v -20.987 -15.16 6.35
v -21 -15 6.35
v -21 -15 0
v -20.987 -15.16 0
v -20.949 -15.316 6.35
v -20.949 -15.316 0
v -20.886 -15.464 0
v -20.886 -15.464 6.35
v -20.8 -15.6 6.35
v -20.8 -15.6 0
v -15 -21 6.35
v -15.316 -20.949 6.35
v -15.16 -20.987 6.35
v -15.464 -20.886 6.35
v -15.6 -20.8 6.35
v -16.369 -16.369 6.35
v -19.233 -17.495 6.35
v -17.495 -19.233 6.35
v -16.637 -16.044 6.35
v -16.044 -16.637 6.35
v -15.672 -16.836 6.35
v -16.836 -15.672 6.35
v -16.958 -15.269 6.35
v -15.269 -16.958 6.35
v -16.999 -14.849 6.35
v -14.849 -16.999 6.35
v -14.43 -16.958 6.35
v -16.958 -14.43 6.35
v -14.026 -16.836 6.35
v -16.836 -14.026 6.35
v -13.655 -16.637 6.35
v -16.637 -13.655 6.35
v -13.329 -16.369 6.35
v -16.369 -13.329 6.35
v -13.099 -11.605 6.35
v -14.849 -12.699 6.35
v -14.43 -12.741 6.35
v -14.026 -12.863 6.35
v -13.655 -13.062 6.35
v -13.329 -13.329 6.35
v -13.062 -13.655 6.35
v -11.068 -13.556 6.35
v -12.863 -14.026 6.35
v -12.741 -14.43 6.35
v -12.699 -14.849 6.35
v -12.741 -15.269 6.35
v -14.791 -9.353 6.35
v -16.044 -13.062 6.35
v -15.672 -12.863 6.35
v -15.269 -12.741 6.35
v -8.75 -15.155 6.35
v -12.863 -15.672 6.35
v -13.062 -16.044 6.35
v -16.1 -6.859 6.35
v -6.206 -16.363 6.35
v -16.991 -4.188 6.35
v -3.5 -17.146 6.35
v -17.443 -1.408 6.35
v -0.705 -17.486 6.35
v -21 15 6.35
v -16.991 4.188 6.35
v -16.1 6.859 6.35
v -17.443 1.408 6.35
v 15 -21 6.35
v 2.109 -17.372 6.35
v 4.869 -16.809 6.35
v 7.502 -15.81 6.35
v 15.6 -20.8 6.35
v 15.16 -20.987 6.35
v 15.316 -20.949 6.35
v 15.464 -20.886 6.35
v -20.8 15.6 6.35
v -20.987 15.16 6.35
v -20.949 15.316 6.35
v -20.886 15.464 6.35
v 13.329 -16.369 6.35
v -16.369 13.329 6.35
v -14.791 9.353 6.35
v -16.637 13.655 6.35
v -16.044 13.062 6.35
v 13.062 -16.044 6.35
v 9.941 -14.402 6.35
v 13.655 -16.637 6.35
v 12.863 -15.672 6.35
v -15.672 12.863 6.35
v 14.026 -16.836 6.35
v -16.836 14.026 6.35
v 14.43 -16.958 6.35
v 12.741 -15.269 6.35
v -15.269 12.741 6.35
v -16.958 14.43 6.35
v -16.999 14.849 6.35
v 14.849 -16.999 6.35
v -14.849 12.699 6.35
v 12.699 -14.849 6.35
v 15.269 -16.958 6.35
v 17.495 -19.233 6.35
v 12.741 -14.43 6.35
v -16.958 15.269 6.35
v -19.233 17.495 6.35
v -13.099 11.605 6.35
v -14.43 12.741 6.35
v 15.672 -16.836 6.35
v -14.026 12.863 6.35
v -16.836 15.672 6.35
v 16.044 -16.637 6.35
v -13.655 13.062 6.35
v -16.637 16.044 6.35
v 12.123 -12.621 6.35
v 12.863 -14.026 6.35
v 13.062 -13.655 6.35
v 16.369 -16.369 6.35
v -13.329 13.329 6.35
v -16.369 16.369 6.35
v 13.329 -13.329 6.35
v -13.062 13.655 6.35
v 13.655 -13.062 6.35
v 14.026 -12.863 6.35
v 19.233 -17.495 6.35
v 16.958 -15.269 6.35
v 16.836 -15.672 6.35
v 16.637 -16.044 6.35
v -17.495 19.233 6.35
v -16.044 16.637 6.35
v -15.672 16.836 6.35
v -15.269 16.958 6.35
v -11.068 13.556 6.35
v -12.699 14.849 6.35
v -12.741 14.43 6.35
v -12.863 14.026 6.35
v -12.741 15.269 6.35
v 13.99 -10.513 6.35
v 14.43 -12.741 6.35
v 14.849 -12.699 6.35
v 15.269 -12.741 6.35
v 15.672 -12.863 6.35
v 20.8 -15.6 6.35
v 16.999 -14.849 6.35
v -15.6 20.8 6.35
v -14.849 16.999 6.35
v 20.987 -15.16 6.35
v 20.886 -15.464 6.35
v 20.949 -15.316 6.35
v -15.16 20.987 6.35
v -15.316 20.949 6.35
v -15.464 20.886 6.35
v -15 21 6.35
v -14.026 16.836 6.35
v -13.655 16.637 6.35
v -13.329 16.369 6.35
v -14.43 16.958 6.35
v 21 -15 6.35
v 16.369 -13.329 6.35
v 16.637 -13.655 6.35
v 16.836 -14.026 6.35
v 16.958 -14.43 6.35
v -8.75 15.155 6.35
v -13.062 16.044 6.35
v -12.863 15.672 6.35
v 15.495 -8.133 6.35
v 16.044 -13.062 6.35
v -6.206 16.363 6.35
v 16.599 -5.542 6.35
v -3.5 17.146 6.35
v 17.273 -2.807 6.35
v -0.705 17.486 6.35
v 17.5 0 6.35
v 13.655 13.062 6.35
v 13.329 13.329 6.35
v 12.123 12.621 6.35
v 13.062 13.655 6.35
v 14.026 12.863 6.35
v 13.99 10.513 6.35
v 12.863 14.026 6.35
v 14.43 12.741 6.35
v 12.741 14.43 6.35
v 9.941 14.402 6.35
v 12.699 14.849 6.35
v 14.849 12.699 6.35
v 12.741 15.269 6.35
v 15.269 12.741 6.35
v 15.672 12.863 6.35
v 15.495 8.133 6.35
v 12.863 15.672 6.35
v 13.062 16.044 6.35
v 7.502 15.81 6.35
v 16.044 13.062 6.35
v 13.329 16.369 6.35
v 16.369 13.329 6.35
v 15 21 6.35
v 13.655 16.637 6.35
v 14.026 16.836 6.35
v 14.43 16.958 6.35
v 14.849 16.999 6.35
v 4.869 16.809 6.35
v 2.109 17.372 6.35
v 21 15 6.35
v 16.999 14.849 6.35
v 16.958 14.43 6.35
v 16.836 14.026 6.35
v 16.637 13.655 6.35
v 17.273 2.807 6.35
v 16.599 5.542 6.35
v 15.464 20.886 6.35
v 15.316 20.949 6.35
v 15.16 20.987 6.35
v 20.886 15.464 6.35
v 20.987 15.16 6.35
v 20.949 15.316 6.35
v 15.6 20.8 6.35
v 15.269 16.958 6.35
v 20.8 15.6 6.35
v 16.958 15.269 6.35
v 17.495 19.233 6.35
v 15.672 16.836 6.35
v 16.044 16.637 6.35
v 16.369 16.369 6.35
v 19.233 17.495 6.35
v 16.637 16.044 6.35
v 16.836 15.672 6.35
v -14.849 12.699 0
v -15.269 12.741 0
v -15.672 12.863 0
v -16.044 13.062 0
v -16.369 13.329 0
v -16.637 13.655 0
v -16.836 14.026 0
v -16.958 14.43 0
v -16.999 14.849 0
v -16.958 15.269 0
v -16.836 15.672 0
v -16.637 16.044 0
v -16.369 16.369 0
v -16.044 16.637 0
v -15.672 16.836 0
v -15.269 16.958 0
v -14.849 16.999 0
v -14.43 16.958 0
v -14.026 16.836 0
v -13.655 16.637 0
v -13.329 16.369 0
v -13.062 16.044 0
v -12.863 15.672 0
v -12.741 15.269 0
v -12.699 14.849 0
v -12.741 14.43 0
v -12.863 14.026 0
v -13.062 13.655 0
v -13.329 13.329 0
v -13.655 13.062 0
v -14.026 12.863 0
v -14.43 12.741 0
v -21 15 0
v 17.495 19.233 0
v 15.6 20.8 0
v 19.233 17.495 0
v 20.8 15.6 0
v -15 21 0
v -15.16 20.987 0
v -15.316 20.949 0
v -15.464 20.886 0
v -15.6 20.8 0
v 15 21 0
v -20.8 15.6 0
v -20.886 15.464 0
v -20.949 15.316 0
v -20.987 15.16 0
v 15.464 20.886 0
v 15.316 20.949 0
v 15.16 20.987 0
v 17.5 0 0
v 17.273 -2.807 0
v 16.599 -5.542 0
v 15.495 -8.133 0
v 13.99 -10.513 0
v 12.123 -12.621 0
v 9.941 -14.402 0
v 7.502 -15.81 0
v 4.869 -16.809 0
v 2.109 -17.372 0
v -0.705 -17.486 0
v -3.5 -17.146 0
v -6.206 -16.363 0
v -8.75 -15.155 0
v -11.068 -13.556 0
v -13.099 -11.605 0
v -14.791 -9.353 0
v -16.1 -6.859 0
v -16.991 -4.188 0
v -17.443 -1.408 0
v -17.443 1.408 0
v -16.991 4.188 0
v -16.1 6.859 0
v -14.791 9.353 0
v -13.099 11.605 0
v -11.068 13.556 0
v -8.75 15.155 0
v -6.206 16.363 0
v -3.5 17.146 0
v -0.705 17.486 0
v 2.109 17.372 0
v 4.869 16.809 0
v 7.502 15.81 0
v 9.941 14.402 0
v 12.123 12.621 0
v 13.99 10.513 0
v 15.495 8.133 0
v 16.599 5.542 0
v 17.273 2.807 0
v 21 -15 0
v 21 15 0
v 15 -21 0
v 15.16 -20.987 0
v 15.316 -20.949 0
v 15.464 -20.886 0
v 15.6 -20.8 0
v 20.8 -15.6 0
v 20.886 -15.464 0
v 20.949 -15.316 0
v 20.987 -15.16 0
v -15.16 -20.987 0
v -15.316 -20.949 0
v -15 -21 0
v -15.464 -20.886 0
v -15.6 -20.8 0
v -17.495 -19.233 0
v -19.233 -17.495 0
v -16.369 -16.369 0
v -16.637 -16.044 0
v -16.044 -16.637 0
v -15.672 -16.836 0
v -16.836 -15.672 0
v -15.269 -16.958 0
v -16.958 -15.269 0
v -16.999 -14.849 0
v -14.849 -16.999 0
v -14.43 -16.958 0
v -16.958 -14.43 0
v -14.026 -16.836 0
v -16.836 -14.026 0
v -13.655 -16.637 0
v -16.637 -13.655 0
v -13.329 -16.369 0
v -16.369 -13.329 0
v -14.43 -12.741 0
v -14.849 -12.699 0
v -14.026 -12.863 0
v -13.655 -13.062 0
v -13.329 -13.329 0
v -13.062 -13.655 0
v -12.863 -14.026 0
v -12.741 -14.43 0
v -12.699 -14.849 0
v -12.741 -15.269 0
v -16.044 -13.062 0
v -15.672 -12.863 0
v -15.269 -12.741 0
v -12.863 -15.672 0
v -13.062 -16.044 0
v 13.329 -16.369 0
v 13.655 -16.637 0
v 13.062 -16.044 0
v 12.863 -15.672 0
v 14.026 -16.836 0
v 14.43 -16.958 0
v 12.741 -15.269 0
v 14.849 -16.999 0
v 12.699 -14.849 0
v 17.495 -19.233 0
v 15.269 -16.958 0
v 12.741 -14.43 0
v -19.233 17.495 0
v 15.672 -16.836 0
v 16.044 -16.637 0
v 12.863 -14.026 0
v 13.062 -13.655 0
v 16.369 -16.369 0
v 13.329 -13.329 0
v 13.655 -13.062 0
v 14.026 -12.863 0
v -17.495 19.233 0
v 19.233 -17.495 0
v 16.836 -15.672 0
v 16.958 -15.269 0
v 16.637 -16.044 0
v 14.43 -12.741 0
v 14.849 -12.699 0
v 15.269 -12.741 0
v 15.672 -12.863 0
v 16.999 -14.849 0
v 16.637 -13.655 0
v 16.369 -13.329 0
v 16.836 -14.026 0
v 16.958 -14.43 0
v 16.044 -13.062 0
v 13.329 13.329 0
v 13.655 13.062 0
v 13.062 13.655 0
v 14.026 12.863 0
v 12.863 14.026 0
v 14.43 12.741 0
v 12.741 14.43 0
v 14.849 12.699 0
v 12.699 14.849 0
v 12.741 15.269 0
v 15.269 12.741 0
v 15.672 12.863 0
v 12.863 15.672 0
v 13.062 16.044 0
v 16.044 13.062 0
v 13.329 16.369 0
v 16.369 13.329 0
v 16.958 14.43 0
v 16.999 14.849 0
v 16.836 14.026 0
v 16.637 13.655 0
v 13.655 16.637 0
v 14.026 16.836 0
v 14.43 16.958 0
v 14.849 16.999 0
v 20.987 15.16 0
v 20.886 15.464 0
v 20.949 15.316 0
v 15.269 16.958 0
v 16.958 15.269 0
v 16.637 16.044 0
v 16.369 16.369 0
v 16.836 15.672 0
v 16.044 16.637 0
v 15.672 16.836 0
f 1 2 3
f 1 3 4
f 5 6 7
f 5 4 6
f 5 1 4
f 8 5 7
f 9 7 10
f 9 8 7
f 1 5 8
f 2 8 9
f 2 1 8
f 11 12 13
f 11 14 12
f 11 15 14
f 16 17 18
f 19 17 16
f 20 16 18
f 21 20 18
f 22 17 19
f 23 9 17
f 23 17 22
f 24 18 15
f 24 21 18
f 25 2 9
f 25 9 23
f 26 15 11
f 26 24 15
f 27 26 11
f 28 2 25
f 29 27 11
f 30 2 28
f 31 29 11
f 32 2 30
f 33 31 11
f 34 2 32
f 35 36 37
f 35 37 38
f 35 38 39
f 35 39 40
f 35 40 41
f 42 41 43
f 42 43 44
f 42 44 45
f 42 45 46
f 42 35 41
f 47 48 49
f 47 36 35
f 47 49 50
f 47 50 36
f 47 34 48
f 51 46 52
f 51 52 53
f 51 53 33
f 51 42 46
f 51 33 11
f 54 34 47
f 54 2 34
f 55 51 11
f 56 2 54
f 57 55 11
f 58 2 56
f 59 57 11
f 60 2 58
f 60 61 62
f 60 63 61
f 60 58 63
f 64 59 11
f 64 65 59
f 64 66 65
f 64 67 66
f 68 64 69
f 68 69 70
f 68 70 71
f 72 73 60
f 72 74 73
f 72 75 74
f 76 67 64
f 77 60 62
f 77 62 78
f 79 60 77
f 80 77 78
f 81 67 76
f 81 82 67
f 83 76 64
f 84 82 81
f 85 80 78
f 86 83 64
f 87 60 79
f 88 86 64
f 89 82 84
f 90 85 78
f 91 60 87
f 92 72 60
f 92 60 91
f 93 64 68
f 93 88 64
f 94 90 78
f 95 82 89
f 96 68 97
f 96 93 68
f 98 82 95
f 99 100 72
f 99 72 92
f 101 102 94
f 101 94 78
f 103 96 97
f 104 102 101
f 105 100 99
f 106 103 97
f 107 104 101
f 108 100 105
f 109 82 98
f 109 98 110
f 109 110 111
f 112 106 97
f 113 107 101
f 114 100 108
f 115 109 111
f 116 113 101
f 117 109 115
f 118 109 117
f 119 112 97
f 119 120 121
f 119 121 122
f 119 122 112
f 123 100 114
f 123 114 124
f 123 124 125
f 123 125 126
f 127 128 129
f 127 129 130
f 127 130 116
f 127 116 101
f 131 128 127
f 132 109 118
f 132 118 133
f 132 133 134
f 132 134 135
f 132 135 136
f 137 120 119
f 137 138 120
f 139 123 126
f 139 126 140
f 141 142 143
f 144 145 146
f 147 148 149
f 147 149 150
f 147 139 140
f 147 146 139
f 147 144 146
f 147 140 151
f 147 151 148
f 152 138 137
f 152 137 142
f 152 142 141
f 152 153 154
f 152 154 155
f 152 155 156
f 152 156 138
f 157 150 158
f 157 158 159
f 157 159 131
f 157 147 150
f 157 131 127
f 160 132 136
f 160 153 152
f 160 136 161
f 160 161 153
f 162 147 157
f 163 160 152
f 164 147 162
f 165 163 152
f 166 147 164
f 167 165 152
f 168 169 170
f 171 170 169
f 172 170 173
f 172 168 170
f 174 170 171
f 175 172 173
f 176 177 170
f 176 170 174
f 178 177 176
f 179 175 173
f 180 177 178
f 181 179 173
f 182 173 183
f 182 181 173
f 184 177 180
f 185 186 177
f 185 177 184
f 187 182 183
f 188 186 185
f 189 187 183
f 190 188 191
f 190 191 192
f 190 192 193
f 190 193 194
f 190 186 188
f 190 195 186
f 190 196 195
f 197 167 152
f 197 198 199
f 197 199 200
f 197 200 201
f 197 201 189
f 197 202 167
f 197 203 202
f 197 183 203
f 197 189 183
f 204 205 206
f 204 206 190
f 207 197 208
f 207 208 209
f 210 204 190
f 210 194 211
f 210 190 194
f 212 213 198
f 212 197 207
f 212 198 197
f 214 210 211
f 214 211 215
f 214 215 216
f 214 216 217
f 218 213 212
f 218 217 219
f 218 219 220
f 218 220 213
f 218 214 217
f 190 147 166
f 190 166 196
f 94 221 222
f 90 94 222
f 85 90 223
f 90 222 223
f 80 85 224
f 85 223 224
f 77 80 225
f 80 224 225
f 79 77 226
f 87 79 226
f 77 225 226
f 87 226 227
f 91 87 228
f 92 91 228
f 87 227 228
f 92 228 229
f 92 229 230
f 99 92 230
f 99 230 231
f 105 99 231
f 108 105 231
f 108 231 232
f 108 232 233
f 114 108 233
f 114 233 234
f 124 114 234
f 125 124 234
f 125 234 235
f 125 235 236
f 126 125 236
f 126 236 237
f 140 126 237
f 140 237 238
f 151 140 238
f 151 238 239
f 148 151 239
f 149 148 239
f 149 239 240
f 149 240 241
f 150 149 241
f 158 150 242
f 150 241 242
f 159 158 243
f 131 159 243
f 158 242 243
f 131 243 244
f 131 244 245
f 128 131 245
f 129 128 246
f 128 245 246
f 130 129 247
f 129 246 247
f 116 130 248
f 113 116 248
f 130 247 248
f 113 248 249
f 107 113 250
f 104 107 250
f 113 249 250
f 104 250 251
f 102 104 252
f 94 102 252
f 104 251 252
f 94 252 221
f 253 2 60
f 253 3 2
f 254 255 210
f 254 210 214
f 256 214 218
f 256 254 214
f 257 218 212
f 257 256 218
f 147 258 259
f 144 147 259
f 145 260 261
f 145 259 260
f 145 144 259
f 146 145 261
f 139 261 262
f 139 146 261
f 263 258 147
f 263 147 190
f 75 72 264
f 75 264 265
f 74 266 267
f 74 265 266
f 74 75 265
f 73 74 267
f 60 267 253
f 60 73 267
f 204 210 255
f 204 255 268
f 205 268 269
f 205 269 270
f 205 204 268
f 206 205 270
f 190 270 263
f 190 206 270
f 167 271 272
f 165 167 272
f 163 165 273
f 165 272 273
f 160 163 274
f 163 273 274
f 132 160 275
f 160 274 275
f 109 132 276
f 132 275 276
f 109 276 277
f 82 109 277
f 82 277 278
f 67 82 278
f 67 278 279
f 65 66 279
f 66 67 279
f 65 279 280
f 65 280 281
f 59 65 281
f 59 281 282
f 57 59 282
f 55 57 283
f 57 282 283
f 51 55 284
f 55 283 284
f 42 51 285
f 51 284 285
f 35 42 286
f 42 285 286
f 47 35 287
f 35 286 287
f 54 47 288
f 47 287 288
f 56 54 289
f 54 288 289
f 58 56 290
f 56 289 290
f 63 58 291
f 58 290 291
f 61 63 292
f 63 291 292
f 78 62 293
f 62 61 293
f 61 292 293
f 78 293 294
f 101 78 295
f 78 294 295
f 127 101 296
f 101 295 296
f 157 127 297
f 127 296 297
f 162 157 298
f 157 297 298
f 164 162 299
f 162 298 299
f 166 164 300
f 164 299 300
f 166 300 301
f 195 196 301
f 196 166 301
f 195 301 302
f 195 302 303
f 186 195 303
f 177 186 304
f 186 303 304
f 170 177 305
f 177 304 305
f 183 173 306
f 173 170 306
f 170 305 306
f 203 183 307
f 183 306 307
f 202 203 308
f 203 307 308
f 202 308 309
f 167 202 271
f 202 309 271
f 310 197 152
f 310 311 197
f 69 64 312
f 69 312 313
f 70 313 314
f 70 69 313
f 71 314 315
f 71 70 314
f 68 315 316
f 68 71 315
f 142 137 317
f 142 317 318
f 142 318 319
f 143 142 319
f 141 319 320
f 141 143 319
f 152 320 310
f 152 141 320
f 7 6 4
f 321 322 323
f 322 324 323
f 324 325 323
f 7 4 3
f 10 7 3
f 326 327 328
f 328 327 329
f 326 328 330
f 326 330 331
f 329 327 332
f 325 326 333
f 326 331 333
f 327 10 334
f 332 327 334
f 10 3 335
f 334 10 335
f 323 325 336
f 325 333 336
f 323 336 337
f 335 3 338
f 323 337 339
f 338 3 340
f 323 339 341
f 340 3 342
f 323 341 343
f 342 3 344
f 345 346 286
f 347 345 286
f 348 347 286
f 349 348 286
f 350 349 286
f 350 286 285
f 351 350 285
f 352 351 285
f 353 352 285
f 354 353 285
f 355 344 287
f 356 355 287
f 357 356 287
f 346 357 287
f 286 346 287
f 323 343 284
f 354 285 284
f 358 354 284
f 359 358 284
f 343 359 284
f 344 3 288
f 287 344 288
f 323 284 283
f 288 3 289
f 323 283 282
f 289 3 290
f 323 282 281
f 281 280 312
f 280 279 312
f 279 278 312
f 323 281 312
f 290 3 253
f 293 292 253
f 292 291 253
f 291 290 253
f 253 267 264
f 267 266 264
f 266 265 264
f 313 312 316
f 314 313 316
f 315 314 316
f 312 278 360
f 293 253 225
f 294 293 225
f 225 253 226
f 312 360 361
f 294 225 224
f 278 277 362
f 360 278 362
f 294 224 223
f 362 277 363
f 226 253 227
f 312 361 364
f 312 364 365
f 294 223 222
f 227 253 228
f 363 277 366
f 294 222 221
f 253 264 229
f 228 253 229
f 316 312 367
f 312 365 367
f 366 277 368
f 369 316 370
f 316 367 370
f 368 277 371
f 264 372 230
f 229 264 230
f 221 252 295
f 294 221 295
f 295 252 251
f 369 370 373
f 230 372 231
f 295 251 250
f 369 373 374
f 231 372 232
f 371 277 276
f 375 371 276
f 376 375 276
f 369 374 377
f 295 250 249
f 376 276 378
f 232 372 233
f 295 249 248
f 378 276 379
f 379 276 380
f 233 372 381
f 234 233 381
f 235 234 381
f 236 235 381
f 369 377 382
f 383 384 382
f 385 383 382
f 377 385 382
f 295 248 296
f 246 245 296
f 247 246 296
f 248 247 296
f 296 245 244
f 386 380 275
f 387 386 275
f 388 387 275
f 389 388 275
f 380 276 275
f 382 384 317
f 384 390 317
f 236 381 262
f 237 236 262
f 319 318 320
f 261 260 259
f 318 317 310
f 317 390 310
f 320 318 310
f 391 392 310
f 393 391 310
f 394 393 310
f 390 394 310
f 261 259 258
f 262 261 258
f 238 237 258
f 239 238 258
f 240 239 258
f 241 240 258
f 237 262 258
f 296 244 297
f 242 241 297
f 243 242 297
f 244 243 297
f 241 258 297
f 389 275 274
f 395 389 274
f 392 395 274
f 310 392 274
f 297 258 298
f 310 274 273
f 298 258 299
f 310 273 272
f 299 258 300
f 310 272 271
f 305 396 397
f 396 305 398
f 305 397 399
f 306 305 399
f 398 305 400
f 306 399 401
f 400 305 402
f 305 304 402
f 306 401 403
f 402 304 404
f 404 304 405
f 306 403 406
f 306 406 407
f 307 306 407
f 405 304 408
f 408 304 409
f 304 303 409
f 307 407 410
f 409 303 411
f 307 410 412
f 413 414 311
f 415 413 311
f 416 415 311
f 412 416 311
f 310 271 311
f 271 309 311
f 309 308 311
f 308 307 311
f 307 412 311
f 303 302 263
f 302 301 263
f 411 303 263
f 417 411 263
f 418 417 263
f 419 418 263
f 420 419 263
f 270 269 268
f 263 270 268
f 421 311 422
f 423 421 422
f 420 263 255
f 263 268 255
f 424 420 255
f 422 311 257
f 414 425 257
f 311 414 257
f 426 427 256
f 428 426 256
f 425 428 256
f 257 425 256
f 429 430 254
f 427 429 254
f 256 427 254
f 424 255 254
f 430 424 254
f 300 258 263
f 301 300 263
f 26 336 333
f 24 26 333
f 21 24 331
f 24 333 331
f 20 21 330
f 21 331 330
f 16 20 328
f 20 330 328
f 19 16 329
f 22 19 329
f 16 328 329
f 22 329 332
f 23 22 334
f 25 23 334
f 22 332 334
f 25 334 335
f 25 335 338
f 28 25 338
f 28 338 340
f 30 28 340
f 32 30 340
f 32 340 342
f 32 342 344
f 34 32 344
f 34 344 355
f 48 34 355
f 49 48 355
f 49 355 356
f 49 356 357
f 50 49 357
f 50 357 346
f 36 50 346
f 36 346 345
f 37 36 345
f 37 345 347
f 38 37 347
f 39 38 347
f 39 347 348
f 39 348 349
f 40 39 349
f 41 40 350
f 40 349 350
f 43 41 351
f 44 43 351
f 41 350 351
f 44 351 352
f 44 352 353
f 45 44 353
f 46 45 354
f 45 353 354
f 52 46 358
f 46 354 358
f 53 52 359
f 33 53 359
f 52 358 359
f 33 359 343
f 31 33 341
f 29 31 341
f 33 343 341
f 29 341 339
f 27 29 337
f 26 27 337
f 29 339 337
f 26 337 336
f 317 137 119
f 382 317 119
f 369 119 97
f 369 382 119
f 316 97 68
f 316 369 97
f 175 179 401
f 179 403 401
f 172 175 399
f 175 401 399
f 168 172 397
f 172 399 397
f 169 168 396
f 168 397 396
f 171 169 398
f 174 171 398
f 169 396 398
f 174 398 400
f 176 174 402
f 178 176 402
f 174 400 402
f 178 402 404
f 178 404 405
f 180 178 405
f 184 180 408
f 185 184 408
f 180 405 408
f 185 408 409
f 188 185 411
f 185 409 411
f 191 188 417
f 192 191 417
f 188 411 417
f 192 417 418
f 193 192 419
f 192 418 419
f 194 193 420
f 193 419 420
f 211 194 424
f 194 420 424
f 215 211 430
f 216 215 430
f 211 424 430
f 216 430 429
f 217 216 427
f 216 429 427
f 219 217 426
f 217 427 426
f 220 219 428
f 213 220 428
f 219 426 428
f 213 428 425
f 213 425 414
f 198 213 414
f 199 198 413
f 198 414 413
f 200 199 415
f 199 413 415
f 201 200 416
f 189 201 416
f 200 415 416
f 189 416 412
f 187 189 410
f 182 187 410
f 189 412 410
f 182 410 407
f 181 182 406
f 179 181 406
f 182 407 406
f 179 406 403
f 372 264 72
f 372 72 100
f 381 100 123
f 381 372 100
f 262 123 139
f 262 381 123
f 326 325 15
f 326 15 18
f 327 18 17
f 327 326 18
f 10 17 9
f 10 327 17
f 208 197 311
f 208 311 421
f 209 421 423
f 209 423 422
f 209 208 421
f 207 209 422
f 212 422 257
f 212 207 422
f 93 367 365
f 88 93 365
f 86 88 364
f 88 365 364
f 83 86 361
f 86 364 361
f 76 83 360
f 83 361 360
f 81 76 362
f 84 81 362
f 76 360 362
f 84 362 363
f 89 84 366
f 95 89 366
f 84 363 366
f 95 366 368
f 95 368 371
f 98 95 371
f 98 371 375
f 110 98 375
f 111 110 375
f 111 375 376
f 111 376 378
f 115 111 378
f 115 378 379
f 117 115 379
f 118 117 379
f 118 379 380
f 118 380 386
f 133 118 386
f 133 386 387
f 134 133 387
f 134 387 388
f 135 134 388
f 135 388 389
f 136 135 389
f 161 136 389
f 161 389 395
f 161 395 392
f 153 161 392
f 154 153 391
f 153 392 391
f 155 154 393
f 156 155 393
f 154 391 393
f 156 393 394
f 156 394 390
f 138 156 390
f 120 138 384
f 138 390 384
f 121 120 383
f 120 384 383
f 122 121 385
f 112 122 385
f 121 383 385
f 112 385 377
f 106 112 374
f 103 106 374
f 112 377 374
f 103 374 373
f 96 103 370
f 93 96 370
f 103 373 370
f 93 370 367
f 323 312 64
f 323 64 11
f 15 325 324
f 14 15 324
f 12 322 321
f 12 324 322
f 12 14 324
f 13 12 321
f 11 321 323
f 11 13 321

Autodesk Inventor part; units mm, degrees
ref_plane "YZ Plane" through (0, 0, 0) normal (1, 0, 0) x (0, 1, 0)
ref_plane "XZ Plane" through (0, 0, 0) normal (0, 1, 0) x (-1, 0, 0)
ref_plane "XY Plane" through (0, 0, 0) normal (0, 0, 1) x (1, 0, 0)
sketch "Sketch1" plane through (0, 0, 0) normal (0, 0, 1) x (1, 0, 0)
  line L0 (21, -21) -> (-21, -21)
  line L1 (-21, -21) -> (-21, 21)
  line L2 (-21, 21) -> (21, 21)
  line L3 (21, 21) -> (21, -21)
  line L4 (21, -21) -> (-21, 21) construction
  line L5 (-21, -21) -> (21, 21) construction
  circle A0 centre (0, 0) radius 17.5
  circle A1 centre (0, 0) radius 26
  line L6 (0, 0) -> (-9.5671, 23.097) construction
  line L7 (0, 0) -> (0, 21) construction
  point P0 (-15.3297, 21)
  point P1 (-21, 15.3297)
  point P2 (-21, -15.3297)
  point P3 (-15.3297, -21)
  point P4 (15.3297, -21)
  point P5 (21, -15.3297)
  point P6 (21, 15.3297)
  point P7 (15.3297, 21)
  dimension "d0" = 42
  dimension "d1" = 42
  dimension "d2" = 35
  dimension "d3" = 52
  dimension "d4" = 25
  dimension "d5" = 22.5
extrude "Extrusion1" add sketch "Sketch1" along normal blind 6.35 contours L0 A1 L1 L2 L3
sketch "Sketch2" plane through (0, 0, 6.35) normal (0, 0, 1) x (1, 0, 0)
  line L0 (14.8492, -14.8492) -> (-14.8492, -14.8492)
  line L1 (-14.8492, -14.8492) -> (-14.8492, 14.8492)
  line L2 (-14.8492, 14.8492) -> (14.8492, 14.8492)
  line L3 (14.8492, 14.8492) -> (14.8492, -14.8492)
  line L4 (14.8492, -14.8492) -> (-14.8492, 14.8492) construction
  line L5 (-14.8492, -14.8492) -> (14.8492, 14.8492) construction
  point P0 (0, 0)
  dimension "d20" = 42
hole "Hole2" at (-14.8492, 14.8492, 6.35) at (14.8492, 14.8492, 6.35) at (14.8492, -14.8492, 6.35) at (-14.8492, -14.8492, 6.35) direction (0, 0, -1) diameter 4.3 end through all
fillet "Fillet1" radius 1 8 edges at (15.3297, -21, 3.175) (21, -15.3297, 3.175) (-21, -15.3297, 3.175) (-15.3297, -21, 3.175) (21, 15.3297, 3.175) (15.3297, 21, 3.175) (-21, 15.3297, 3.175) (-15.3297, 21, 3.175)
properties part number "Ballscrew Spacer"
